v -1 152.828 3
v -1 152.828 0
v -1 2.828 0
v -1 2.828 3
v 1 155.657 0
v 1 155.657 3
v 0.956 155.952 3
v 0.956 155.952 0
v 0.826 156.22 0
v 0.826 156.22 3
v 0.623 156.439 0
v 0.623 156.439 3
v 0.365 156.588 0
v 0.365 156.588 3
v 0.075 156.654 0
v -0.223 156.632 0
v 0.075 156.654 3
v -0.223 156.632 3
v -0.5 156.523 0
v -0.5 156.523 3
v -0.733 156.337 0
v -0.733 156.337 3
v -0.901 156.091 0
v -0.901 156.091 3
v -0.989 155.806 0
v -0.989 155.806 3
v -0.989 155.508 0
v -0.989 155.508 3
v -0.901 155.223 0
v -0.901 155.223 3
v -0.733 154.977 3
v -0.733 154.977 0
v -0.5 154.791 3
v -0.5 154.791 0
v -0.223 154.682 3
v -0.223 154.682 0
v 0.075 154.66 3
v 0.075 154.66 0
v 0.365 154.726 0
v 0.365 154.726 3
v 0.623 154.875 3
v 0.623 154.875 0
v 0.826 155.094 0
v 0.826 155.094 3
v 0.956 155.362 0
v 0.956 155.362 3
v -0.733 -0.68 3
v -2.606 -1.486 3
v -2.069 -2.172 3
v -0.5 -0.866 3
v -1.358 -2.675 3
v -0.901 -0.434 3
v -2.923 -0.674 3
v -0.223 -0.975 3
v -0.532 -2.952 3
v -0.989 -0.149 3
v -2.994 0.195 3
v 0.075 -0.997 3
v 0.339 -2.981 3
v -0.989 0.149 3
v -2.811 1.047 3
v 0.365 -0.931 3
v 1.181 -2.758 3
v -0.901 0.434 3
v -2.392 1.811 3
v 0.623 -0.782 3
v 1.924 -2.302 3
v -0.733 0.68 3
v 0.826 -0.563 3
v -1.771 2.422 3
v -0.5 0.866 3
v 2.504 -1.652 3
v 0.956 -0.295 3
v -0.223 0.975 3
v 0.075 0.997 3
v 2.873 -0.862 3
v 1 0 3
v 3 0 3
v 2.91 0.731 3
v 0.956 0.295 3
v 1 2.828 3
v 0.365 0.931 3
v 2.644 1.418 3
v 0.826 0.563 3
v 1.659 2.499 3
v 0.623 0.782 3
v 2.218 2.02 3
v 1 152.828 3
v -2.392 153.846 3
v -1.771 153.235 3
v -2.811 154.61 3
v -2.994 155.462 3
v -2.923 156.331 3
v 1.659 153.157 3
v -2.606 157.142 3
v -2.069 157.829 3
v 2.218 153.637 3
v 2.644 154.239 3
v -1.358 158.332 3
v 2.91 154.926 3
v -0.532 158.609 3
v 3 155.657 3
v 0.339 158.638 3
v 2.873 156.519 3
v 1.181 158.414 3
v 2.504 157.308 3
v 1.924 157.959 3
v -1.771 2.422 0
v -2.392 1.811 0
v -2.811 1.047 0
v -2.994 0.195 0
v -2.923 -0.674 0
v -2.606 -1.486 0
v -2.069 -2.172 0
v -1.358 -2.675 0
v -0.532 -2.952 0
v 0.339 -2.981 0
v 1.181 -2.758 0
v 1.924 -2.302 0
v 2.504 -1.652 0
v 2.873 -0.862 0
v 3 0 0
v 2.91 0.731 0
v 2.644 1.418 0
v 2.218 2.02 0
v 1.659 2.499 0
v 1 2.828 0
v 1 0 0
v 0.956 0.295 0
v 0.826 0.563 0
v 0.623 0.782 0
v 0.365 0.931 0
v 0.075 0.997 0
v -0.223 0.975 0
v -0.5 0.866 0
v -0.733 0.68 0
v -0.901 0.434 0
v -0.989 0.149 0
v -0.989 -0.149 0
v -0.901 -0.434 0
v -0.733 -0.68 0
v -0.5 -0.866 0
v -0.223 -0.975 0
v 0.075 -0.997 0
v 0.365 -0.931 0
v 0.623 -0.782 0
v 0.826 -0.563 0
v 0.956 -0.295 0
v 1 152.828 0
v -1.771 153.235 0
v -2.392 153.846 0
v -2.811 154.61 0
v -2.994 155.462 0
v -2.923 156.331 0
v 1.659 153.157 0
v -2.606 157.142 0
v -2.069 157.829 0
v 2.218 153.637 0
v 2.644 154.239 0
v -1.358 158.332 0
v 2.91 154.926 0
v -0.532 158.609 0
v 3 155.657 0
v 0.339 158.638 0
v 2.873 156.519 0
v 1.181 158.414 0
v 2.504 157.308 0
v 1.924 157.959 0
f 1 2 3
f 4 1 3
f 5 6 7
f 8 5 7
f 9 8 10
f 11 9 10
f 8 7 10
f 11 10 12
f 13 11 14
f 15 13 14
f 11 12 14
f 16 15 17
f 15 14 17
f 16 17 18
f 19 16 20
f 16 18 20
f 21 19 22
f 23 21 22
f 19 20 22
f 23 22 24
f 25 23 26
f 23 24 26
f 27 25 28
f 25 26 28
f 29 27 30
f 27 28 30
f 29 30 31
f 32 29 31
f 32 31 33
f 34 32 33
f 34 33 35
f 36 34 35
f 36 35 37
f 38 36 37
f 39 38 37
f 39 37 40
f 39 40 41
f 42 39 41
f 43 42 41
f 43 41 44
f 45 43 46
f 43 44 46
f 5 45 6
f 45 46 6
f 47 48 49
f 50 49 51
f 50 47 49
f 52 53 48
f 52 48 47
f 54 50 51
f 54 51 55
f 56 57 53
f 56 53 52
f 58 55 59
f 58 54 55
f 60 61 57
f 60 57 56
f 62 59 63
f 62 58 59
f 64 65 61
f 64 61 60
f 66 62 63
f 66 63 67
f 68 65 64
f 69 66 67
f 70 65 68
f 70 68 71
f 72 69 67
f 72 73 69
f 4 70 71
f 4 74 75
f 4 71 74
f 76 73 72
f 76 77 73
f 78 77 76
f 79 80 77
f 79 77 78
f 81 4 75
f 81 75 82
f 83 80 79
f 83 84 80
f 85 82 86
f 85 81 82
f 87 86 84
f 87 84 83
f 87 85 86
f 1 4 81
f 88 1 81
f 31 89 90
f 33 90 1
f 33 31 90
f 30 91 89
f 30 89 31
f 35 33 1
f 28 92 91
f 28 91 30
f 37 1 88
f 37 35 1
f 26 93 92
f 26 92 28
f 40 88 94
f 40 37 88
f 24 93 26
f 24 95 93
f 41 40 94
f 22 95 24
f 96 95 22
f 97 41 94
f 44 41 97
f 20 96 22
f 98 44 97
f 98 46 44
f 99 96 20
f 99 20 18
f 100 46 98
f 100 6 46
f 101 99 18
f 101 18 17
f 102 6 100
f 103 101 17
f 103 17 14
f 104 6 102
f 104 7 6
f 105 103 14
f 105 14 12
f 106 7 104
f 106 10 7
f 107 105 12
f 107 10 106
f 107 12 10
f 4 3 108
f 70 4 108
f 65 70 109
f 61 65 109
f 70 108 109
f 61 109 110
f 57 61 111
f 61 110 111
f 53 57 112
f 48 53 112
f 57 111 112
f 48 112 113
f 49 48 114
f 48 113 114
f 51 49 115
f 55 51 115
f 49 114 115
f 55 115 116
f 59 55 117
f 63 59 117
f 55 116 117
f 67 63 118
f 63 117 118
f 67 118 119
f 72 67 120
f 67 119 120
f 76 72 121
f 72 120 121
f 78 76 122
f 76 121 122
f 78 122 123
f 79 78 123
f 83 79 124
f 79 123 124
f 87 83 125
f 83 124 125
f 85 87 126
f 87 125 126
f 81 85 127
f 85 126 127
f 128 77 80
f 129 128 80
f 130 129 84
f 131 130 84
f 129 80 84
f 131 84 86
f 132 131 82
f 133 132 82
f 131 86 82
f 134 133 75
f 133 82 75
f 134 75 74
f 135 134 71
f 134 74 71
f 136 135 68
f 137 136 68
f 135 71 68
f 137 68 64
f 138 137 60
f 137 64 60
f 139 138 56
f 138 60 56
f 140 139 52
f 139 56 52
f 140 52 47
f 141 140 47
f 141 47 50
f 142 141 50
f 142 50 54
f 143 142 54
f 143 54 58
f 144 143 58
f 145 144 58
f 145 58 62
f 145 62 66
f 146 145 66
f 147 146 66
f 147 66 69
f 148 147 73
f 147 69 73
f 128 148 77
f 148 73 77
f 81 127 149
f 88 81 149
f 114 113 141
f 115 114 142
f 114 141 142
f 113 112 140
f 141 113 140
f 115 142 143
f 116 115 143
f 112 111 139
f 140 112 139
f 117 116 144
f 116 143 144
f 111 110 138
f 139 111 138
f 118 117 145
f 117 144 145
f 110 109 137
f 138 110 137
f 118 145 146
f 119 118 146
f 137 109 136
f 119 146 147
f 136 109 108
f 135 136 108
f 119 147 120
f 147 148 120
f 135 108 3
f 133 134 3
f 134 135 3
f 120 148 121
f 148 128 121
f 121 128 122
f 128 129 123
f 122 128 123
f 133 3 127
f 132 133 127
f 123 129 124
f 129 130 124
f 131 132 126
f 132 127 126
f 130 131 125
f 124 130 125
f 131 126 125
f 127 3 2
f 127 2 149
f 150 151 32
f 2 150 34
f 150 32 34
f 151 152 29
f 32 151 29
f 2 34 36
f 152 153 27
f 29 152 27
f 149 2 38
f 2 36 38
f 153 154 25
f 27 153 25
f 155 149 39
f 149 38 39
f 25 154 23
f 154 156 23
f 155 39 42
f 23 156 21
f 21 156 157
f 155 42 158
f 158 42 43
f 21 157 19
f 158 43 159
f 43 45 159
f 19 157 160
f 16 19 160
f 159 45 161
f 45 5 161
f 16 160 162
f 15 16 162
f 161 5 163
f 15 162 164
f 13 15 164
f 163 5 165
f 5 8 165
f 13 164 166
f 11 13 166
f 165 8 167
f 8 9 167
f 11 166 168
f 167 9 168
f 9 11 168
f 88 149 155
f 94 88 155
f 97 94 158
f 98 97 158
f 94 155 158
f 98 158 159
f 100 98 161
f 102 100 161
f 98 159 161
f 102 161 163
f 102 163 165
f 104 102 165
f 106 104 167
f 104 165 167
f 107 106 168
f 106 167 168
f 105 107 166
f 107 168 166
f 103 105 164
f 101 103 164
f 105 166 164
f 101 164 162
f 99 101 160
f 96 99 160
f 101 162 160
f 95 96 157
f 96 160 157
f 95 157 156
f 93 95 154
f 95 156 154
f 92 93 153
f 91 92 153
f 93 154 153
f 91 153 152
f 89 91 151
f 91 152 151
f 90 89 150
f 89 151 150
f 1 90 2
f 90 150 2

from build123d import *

# Parameters (mm, degrees)
EXTRUDE_3_DEPTH     = 3
SKETCH_3_R          = 1
CUT_EXTRUDE_1_DEPTH = 3


with BuildPart() as part:
    # 草图1 → 凸台-拉伸3 (new body)
    with BuildSketch(Plane.XY):
        with BuildLine():
            Line((1, 2.828427125), (1, 152.828427125))
            ThreePointArc((1, 152.828427125), (0, 158.656854249), (-1, 152.828427125))
            Line((-1, 152.828427125), (-1, 2.828427125))
            ThreePointArc((-1, 2.828427125), (0, -3), (1, 2.828427125))
        make_face()
    extrude(amount=EXTRUDE_3_DEPTH)

    # 草图3 → 切除-拉伸1 (cut)
    with BuildSketch(Plane.XY.offset(3)):
        Circle(SKETCH_3_R)
        with Locations((0, 155.656854249)):
            Circle(SKETCH_3_R)
    extrude(amount=-CUT_EXTRUDE_1_DEPTH, mode=Mode.SUBTRACT)


solid = part.part
